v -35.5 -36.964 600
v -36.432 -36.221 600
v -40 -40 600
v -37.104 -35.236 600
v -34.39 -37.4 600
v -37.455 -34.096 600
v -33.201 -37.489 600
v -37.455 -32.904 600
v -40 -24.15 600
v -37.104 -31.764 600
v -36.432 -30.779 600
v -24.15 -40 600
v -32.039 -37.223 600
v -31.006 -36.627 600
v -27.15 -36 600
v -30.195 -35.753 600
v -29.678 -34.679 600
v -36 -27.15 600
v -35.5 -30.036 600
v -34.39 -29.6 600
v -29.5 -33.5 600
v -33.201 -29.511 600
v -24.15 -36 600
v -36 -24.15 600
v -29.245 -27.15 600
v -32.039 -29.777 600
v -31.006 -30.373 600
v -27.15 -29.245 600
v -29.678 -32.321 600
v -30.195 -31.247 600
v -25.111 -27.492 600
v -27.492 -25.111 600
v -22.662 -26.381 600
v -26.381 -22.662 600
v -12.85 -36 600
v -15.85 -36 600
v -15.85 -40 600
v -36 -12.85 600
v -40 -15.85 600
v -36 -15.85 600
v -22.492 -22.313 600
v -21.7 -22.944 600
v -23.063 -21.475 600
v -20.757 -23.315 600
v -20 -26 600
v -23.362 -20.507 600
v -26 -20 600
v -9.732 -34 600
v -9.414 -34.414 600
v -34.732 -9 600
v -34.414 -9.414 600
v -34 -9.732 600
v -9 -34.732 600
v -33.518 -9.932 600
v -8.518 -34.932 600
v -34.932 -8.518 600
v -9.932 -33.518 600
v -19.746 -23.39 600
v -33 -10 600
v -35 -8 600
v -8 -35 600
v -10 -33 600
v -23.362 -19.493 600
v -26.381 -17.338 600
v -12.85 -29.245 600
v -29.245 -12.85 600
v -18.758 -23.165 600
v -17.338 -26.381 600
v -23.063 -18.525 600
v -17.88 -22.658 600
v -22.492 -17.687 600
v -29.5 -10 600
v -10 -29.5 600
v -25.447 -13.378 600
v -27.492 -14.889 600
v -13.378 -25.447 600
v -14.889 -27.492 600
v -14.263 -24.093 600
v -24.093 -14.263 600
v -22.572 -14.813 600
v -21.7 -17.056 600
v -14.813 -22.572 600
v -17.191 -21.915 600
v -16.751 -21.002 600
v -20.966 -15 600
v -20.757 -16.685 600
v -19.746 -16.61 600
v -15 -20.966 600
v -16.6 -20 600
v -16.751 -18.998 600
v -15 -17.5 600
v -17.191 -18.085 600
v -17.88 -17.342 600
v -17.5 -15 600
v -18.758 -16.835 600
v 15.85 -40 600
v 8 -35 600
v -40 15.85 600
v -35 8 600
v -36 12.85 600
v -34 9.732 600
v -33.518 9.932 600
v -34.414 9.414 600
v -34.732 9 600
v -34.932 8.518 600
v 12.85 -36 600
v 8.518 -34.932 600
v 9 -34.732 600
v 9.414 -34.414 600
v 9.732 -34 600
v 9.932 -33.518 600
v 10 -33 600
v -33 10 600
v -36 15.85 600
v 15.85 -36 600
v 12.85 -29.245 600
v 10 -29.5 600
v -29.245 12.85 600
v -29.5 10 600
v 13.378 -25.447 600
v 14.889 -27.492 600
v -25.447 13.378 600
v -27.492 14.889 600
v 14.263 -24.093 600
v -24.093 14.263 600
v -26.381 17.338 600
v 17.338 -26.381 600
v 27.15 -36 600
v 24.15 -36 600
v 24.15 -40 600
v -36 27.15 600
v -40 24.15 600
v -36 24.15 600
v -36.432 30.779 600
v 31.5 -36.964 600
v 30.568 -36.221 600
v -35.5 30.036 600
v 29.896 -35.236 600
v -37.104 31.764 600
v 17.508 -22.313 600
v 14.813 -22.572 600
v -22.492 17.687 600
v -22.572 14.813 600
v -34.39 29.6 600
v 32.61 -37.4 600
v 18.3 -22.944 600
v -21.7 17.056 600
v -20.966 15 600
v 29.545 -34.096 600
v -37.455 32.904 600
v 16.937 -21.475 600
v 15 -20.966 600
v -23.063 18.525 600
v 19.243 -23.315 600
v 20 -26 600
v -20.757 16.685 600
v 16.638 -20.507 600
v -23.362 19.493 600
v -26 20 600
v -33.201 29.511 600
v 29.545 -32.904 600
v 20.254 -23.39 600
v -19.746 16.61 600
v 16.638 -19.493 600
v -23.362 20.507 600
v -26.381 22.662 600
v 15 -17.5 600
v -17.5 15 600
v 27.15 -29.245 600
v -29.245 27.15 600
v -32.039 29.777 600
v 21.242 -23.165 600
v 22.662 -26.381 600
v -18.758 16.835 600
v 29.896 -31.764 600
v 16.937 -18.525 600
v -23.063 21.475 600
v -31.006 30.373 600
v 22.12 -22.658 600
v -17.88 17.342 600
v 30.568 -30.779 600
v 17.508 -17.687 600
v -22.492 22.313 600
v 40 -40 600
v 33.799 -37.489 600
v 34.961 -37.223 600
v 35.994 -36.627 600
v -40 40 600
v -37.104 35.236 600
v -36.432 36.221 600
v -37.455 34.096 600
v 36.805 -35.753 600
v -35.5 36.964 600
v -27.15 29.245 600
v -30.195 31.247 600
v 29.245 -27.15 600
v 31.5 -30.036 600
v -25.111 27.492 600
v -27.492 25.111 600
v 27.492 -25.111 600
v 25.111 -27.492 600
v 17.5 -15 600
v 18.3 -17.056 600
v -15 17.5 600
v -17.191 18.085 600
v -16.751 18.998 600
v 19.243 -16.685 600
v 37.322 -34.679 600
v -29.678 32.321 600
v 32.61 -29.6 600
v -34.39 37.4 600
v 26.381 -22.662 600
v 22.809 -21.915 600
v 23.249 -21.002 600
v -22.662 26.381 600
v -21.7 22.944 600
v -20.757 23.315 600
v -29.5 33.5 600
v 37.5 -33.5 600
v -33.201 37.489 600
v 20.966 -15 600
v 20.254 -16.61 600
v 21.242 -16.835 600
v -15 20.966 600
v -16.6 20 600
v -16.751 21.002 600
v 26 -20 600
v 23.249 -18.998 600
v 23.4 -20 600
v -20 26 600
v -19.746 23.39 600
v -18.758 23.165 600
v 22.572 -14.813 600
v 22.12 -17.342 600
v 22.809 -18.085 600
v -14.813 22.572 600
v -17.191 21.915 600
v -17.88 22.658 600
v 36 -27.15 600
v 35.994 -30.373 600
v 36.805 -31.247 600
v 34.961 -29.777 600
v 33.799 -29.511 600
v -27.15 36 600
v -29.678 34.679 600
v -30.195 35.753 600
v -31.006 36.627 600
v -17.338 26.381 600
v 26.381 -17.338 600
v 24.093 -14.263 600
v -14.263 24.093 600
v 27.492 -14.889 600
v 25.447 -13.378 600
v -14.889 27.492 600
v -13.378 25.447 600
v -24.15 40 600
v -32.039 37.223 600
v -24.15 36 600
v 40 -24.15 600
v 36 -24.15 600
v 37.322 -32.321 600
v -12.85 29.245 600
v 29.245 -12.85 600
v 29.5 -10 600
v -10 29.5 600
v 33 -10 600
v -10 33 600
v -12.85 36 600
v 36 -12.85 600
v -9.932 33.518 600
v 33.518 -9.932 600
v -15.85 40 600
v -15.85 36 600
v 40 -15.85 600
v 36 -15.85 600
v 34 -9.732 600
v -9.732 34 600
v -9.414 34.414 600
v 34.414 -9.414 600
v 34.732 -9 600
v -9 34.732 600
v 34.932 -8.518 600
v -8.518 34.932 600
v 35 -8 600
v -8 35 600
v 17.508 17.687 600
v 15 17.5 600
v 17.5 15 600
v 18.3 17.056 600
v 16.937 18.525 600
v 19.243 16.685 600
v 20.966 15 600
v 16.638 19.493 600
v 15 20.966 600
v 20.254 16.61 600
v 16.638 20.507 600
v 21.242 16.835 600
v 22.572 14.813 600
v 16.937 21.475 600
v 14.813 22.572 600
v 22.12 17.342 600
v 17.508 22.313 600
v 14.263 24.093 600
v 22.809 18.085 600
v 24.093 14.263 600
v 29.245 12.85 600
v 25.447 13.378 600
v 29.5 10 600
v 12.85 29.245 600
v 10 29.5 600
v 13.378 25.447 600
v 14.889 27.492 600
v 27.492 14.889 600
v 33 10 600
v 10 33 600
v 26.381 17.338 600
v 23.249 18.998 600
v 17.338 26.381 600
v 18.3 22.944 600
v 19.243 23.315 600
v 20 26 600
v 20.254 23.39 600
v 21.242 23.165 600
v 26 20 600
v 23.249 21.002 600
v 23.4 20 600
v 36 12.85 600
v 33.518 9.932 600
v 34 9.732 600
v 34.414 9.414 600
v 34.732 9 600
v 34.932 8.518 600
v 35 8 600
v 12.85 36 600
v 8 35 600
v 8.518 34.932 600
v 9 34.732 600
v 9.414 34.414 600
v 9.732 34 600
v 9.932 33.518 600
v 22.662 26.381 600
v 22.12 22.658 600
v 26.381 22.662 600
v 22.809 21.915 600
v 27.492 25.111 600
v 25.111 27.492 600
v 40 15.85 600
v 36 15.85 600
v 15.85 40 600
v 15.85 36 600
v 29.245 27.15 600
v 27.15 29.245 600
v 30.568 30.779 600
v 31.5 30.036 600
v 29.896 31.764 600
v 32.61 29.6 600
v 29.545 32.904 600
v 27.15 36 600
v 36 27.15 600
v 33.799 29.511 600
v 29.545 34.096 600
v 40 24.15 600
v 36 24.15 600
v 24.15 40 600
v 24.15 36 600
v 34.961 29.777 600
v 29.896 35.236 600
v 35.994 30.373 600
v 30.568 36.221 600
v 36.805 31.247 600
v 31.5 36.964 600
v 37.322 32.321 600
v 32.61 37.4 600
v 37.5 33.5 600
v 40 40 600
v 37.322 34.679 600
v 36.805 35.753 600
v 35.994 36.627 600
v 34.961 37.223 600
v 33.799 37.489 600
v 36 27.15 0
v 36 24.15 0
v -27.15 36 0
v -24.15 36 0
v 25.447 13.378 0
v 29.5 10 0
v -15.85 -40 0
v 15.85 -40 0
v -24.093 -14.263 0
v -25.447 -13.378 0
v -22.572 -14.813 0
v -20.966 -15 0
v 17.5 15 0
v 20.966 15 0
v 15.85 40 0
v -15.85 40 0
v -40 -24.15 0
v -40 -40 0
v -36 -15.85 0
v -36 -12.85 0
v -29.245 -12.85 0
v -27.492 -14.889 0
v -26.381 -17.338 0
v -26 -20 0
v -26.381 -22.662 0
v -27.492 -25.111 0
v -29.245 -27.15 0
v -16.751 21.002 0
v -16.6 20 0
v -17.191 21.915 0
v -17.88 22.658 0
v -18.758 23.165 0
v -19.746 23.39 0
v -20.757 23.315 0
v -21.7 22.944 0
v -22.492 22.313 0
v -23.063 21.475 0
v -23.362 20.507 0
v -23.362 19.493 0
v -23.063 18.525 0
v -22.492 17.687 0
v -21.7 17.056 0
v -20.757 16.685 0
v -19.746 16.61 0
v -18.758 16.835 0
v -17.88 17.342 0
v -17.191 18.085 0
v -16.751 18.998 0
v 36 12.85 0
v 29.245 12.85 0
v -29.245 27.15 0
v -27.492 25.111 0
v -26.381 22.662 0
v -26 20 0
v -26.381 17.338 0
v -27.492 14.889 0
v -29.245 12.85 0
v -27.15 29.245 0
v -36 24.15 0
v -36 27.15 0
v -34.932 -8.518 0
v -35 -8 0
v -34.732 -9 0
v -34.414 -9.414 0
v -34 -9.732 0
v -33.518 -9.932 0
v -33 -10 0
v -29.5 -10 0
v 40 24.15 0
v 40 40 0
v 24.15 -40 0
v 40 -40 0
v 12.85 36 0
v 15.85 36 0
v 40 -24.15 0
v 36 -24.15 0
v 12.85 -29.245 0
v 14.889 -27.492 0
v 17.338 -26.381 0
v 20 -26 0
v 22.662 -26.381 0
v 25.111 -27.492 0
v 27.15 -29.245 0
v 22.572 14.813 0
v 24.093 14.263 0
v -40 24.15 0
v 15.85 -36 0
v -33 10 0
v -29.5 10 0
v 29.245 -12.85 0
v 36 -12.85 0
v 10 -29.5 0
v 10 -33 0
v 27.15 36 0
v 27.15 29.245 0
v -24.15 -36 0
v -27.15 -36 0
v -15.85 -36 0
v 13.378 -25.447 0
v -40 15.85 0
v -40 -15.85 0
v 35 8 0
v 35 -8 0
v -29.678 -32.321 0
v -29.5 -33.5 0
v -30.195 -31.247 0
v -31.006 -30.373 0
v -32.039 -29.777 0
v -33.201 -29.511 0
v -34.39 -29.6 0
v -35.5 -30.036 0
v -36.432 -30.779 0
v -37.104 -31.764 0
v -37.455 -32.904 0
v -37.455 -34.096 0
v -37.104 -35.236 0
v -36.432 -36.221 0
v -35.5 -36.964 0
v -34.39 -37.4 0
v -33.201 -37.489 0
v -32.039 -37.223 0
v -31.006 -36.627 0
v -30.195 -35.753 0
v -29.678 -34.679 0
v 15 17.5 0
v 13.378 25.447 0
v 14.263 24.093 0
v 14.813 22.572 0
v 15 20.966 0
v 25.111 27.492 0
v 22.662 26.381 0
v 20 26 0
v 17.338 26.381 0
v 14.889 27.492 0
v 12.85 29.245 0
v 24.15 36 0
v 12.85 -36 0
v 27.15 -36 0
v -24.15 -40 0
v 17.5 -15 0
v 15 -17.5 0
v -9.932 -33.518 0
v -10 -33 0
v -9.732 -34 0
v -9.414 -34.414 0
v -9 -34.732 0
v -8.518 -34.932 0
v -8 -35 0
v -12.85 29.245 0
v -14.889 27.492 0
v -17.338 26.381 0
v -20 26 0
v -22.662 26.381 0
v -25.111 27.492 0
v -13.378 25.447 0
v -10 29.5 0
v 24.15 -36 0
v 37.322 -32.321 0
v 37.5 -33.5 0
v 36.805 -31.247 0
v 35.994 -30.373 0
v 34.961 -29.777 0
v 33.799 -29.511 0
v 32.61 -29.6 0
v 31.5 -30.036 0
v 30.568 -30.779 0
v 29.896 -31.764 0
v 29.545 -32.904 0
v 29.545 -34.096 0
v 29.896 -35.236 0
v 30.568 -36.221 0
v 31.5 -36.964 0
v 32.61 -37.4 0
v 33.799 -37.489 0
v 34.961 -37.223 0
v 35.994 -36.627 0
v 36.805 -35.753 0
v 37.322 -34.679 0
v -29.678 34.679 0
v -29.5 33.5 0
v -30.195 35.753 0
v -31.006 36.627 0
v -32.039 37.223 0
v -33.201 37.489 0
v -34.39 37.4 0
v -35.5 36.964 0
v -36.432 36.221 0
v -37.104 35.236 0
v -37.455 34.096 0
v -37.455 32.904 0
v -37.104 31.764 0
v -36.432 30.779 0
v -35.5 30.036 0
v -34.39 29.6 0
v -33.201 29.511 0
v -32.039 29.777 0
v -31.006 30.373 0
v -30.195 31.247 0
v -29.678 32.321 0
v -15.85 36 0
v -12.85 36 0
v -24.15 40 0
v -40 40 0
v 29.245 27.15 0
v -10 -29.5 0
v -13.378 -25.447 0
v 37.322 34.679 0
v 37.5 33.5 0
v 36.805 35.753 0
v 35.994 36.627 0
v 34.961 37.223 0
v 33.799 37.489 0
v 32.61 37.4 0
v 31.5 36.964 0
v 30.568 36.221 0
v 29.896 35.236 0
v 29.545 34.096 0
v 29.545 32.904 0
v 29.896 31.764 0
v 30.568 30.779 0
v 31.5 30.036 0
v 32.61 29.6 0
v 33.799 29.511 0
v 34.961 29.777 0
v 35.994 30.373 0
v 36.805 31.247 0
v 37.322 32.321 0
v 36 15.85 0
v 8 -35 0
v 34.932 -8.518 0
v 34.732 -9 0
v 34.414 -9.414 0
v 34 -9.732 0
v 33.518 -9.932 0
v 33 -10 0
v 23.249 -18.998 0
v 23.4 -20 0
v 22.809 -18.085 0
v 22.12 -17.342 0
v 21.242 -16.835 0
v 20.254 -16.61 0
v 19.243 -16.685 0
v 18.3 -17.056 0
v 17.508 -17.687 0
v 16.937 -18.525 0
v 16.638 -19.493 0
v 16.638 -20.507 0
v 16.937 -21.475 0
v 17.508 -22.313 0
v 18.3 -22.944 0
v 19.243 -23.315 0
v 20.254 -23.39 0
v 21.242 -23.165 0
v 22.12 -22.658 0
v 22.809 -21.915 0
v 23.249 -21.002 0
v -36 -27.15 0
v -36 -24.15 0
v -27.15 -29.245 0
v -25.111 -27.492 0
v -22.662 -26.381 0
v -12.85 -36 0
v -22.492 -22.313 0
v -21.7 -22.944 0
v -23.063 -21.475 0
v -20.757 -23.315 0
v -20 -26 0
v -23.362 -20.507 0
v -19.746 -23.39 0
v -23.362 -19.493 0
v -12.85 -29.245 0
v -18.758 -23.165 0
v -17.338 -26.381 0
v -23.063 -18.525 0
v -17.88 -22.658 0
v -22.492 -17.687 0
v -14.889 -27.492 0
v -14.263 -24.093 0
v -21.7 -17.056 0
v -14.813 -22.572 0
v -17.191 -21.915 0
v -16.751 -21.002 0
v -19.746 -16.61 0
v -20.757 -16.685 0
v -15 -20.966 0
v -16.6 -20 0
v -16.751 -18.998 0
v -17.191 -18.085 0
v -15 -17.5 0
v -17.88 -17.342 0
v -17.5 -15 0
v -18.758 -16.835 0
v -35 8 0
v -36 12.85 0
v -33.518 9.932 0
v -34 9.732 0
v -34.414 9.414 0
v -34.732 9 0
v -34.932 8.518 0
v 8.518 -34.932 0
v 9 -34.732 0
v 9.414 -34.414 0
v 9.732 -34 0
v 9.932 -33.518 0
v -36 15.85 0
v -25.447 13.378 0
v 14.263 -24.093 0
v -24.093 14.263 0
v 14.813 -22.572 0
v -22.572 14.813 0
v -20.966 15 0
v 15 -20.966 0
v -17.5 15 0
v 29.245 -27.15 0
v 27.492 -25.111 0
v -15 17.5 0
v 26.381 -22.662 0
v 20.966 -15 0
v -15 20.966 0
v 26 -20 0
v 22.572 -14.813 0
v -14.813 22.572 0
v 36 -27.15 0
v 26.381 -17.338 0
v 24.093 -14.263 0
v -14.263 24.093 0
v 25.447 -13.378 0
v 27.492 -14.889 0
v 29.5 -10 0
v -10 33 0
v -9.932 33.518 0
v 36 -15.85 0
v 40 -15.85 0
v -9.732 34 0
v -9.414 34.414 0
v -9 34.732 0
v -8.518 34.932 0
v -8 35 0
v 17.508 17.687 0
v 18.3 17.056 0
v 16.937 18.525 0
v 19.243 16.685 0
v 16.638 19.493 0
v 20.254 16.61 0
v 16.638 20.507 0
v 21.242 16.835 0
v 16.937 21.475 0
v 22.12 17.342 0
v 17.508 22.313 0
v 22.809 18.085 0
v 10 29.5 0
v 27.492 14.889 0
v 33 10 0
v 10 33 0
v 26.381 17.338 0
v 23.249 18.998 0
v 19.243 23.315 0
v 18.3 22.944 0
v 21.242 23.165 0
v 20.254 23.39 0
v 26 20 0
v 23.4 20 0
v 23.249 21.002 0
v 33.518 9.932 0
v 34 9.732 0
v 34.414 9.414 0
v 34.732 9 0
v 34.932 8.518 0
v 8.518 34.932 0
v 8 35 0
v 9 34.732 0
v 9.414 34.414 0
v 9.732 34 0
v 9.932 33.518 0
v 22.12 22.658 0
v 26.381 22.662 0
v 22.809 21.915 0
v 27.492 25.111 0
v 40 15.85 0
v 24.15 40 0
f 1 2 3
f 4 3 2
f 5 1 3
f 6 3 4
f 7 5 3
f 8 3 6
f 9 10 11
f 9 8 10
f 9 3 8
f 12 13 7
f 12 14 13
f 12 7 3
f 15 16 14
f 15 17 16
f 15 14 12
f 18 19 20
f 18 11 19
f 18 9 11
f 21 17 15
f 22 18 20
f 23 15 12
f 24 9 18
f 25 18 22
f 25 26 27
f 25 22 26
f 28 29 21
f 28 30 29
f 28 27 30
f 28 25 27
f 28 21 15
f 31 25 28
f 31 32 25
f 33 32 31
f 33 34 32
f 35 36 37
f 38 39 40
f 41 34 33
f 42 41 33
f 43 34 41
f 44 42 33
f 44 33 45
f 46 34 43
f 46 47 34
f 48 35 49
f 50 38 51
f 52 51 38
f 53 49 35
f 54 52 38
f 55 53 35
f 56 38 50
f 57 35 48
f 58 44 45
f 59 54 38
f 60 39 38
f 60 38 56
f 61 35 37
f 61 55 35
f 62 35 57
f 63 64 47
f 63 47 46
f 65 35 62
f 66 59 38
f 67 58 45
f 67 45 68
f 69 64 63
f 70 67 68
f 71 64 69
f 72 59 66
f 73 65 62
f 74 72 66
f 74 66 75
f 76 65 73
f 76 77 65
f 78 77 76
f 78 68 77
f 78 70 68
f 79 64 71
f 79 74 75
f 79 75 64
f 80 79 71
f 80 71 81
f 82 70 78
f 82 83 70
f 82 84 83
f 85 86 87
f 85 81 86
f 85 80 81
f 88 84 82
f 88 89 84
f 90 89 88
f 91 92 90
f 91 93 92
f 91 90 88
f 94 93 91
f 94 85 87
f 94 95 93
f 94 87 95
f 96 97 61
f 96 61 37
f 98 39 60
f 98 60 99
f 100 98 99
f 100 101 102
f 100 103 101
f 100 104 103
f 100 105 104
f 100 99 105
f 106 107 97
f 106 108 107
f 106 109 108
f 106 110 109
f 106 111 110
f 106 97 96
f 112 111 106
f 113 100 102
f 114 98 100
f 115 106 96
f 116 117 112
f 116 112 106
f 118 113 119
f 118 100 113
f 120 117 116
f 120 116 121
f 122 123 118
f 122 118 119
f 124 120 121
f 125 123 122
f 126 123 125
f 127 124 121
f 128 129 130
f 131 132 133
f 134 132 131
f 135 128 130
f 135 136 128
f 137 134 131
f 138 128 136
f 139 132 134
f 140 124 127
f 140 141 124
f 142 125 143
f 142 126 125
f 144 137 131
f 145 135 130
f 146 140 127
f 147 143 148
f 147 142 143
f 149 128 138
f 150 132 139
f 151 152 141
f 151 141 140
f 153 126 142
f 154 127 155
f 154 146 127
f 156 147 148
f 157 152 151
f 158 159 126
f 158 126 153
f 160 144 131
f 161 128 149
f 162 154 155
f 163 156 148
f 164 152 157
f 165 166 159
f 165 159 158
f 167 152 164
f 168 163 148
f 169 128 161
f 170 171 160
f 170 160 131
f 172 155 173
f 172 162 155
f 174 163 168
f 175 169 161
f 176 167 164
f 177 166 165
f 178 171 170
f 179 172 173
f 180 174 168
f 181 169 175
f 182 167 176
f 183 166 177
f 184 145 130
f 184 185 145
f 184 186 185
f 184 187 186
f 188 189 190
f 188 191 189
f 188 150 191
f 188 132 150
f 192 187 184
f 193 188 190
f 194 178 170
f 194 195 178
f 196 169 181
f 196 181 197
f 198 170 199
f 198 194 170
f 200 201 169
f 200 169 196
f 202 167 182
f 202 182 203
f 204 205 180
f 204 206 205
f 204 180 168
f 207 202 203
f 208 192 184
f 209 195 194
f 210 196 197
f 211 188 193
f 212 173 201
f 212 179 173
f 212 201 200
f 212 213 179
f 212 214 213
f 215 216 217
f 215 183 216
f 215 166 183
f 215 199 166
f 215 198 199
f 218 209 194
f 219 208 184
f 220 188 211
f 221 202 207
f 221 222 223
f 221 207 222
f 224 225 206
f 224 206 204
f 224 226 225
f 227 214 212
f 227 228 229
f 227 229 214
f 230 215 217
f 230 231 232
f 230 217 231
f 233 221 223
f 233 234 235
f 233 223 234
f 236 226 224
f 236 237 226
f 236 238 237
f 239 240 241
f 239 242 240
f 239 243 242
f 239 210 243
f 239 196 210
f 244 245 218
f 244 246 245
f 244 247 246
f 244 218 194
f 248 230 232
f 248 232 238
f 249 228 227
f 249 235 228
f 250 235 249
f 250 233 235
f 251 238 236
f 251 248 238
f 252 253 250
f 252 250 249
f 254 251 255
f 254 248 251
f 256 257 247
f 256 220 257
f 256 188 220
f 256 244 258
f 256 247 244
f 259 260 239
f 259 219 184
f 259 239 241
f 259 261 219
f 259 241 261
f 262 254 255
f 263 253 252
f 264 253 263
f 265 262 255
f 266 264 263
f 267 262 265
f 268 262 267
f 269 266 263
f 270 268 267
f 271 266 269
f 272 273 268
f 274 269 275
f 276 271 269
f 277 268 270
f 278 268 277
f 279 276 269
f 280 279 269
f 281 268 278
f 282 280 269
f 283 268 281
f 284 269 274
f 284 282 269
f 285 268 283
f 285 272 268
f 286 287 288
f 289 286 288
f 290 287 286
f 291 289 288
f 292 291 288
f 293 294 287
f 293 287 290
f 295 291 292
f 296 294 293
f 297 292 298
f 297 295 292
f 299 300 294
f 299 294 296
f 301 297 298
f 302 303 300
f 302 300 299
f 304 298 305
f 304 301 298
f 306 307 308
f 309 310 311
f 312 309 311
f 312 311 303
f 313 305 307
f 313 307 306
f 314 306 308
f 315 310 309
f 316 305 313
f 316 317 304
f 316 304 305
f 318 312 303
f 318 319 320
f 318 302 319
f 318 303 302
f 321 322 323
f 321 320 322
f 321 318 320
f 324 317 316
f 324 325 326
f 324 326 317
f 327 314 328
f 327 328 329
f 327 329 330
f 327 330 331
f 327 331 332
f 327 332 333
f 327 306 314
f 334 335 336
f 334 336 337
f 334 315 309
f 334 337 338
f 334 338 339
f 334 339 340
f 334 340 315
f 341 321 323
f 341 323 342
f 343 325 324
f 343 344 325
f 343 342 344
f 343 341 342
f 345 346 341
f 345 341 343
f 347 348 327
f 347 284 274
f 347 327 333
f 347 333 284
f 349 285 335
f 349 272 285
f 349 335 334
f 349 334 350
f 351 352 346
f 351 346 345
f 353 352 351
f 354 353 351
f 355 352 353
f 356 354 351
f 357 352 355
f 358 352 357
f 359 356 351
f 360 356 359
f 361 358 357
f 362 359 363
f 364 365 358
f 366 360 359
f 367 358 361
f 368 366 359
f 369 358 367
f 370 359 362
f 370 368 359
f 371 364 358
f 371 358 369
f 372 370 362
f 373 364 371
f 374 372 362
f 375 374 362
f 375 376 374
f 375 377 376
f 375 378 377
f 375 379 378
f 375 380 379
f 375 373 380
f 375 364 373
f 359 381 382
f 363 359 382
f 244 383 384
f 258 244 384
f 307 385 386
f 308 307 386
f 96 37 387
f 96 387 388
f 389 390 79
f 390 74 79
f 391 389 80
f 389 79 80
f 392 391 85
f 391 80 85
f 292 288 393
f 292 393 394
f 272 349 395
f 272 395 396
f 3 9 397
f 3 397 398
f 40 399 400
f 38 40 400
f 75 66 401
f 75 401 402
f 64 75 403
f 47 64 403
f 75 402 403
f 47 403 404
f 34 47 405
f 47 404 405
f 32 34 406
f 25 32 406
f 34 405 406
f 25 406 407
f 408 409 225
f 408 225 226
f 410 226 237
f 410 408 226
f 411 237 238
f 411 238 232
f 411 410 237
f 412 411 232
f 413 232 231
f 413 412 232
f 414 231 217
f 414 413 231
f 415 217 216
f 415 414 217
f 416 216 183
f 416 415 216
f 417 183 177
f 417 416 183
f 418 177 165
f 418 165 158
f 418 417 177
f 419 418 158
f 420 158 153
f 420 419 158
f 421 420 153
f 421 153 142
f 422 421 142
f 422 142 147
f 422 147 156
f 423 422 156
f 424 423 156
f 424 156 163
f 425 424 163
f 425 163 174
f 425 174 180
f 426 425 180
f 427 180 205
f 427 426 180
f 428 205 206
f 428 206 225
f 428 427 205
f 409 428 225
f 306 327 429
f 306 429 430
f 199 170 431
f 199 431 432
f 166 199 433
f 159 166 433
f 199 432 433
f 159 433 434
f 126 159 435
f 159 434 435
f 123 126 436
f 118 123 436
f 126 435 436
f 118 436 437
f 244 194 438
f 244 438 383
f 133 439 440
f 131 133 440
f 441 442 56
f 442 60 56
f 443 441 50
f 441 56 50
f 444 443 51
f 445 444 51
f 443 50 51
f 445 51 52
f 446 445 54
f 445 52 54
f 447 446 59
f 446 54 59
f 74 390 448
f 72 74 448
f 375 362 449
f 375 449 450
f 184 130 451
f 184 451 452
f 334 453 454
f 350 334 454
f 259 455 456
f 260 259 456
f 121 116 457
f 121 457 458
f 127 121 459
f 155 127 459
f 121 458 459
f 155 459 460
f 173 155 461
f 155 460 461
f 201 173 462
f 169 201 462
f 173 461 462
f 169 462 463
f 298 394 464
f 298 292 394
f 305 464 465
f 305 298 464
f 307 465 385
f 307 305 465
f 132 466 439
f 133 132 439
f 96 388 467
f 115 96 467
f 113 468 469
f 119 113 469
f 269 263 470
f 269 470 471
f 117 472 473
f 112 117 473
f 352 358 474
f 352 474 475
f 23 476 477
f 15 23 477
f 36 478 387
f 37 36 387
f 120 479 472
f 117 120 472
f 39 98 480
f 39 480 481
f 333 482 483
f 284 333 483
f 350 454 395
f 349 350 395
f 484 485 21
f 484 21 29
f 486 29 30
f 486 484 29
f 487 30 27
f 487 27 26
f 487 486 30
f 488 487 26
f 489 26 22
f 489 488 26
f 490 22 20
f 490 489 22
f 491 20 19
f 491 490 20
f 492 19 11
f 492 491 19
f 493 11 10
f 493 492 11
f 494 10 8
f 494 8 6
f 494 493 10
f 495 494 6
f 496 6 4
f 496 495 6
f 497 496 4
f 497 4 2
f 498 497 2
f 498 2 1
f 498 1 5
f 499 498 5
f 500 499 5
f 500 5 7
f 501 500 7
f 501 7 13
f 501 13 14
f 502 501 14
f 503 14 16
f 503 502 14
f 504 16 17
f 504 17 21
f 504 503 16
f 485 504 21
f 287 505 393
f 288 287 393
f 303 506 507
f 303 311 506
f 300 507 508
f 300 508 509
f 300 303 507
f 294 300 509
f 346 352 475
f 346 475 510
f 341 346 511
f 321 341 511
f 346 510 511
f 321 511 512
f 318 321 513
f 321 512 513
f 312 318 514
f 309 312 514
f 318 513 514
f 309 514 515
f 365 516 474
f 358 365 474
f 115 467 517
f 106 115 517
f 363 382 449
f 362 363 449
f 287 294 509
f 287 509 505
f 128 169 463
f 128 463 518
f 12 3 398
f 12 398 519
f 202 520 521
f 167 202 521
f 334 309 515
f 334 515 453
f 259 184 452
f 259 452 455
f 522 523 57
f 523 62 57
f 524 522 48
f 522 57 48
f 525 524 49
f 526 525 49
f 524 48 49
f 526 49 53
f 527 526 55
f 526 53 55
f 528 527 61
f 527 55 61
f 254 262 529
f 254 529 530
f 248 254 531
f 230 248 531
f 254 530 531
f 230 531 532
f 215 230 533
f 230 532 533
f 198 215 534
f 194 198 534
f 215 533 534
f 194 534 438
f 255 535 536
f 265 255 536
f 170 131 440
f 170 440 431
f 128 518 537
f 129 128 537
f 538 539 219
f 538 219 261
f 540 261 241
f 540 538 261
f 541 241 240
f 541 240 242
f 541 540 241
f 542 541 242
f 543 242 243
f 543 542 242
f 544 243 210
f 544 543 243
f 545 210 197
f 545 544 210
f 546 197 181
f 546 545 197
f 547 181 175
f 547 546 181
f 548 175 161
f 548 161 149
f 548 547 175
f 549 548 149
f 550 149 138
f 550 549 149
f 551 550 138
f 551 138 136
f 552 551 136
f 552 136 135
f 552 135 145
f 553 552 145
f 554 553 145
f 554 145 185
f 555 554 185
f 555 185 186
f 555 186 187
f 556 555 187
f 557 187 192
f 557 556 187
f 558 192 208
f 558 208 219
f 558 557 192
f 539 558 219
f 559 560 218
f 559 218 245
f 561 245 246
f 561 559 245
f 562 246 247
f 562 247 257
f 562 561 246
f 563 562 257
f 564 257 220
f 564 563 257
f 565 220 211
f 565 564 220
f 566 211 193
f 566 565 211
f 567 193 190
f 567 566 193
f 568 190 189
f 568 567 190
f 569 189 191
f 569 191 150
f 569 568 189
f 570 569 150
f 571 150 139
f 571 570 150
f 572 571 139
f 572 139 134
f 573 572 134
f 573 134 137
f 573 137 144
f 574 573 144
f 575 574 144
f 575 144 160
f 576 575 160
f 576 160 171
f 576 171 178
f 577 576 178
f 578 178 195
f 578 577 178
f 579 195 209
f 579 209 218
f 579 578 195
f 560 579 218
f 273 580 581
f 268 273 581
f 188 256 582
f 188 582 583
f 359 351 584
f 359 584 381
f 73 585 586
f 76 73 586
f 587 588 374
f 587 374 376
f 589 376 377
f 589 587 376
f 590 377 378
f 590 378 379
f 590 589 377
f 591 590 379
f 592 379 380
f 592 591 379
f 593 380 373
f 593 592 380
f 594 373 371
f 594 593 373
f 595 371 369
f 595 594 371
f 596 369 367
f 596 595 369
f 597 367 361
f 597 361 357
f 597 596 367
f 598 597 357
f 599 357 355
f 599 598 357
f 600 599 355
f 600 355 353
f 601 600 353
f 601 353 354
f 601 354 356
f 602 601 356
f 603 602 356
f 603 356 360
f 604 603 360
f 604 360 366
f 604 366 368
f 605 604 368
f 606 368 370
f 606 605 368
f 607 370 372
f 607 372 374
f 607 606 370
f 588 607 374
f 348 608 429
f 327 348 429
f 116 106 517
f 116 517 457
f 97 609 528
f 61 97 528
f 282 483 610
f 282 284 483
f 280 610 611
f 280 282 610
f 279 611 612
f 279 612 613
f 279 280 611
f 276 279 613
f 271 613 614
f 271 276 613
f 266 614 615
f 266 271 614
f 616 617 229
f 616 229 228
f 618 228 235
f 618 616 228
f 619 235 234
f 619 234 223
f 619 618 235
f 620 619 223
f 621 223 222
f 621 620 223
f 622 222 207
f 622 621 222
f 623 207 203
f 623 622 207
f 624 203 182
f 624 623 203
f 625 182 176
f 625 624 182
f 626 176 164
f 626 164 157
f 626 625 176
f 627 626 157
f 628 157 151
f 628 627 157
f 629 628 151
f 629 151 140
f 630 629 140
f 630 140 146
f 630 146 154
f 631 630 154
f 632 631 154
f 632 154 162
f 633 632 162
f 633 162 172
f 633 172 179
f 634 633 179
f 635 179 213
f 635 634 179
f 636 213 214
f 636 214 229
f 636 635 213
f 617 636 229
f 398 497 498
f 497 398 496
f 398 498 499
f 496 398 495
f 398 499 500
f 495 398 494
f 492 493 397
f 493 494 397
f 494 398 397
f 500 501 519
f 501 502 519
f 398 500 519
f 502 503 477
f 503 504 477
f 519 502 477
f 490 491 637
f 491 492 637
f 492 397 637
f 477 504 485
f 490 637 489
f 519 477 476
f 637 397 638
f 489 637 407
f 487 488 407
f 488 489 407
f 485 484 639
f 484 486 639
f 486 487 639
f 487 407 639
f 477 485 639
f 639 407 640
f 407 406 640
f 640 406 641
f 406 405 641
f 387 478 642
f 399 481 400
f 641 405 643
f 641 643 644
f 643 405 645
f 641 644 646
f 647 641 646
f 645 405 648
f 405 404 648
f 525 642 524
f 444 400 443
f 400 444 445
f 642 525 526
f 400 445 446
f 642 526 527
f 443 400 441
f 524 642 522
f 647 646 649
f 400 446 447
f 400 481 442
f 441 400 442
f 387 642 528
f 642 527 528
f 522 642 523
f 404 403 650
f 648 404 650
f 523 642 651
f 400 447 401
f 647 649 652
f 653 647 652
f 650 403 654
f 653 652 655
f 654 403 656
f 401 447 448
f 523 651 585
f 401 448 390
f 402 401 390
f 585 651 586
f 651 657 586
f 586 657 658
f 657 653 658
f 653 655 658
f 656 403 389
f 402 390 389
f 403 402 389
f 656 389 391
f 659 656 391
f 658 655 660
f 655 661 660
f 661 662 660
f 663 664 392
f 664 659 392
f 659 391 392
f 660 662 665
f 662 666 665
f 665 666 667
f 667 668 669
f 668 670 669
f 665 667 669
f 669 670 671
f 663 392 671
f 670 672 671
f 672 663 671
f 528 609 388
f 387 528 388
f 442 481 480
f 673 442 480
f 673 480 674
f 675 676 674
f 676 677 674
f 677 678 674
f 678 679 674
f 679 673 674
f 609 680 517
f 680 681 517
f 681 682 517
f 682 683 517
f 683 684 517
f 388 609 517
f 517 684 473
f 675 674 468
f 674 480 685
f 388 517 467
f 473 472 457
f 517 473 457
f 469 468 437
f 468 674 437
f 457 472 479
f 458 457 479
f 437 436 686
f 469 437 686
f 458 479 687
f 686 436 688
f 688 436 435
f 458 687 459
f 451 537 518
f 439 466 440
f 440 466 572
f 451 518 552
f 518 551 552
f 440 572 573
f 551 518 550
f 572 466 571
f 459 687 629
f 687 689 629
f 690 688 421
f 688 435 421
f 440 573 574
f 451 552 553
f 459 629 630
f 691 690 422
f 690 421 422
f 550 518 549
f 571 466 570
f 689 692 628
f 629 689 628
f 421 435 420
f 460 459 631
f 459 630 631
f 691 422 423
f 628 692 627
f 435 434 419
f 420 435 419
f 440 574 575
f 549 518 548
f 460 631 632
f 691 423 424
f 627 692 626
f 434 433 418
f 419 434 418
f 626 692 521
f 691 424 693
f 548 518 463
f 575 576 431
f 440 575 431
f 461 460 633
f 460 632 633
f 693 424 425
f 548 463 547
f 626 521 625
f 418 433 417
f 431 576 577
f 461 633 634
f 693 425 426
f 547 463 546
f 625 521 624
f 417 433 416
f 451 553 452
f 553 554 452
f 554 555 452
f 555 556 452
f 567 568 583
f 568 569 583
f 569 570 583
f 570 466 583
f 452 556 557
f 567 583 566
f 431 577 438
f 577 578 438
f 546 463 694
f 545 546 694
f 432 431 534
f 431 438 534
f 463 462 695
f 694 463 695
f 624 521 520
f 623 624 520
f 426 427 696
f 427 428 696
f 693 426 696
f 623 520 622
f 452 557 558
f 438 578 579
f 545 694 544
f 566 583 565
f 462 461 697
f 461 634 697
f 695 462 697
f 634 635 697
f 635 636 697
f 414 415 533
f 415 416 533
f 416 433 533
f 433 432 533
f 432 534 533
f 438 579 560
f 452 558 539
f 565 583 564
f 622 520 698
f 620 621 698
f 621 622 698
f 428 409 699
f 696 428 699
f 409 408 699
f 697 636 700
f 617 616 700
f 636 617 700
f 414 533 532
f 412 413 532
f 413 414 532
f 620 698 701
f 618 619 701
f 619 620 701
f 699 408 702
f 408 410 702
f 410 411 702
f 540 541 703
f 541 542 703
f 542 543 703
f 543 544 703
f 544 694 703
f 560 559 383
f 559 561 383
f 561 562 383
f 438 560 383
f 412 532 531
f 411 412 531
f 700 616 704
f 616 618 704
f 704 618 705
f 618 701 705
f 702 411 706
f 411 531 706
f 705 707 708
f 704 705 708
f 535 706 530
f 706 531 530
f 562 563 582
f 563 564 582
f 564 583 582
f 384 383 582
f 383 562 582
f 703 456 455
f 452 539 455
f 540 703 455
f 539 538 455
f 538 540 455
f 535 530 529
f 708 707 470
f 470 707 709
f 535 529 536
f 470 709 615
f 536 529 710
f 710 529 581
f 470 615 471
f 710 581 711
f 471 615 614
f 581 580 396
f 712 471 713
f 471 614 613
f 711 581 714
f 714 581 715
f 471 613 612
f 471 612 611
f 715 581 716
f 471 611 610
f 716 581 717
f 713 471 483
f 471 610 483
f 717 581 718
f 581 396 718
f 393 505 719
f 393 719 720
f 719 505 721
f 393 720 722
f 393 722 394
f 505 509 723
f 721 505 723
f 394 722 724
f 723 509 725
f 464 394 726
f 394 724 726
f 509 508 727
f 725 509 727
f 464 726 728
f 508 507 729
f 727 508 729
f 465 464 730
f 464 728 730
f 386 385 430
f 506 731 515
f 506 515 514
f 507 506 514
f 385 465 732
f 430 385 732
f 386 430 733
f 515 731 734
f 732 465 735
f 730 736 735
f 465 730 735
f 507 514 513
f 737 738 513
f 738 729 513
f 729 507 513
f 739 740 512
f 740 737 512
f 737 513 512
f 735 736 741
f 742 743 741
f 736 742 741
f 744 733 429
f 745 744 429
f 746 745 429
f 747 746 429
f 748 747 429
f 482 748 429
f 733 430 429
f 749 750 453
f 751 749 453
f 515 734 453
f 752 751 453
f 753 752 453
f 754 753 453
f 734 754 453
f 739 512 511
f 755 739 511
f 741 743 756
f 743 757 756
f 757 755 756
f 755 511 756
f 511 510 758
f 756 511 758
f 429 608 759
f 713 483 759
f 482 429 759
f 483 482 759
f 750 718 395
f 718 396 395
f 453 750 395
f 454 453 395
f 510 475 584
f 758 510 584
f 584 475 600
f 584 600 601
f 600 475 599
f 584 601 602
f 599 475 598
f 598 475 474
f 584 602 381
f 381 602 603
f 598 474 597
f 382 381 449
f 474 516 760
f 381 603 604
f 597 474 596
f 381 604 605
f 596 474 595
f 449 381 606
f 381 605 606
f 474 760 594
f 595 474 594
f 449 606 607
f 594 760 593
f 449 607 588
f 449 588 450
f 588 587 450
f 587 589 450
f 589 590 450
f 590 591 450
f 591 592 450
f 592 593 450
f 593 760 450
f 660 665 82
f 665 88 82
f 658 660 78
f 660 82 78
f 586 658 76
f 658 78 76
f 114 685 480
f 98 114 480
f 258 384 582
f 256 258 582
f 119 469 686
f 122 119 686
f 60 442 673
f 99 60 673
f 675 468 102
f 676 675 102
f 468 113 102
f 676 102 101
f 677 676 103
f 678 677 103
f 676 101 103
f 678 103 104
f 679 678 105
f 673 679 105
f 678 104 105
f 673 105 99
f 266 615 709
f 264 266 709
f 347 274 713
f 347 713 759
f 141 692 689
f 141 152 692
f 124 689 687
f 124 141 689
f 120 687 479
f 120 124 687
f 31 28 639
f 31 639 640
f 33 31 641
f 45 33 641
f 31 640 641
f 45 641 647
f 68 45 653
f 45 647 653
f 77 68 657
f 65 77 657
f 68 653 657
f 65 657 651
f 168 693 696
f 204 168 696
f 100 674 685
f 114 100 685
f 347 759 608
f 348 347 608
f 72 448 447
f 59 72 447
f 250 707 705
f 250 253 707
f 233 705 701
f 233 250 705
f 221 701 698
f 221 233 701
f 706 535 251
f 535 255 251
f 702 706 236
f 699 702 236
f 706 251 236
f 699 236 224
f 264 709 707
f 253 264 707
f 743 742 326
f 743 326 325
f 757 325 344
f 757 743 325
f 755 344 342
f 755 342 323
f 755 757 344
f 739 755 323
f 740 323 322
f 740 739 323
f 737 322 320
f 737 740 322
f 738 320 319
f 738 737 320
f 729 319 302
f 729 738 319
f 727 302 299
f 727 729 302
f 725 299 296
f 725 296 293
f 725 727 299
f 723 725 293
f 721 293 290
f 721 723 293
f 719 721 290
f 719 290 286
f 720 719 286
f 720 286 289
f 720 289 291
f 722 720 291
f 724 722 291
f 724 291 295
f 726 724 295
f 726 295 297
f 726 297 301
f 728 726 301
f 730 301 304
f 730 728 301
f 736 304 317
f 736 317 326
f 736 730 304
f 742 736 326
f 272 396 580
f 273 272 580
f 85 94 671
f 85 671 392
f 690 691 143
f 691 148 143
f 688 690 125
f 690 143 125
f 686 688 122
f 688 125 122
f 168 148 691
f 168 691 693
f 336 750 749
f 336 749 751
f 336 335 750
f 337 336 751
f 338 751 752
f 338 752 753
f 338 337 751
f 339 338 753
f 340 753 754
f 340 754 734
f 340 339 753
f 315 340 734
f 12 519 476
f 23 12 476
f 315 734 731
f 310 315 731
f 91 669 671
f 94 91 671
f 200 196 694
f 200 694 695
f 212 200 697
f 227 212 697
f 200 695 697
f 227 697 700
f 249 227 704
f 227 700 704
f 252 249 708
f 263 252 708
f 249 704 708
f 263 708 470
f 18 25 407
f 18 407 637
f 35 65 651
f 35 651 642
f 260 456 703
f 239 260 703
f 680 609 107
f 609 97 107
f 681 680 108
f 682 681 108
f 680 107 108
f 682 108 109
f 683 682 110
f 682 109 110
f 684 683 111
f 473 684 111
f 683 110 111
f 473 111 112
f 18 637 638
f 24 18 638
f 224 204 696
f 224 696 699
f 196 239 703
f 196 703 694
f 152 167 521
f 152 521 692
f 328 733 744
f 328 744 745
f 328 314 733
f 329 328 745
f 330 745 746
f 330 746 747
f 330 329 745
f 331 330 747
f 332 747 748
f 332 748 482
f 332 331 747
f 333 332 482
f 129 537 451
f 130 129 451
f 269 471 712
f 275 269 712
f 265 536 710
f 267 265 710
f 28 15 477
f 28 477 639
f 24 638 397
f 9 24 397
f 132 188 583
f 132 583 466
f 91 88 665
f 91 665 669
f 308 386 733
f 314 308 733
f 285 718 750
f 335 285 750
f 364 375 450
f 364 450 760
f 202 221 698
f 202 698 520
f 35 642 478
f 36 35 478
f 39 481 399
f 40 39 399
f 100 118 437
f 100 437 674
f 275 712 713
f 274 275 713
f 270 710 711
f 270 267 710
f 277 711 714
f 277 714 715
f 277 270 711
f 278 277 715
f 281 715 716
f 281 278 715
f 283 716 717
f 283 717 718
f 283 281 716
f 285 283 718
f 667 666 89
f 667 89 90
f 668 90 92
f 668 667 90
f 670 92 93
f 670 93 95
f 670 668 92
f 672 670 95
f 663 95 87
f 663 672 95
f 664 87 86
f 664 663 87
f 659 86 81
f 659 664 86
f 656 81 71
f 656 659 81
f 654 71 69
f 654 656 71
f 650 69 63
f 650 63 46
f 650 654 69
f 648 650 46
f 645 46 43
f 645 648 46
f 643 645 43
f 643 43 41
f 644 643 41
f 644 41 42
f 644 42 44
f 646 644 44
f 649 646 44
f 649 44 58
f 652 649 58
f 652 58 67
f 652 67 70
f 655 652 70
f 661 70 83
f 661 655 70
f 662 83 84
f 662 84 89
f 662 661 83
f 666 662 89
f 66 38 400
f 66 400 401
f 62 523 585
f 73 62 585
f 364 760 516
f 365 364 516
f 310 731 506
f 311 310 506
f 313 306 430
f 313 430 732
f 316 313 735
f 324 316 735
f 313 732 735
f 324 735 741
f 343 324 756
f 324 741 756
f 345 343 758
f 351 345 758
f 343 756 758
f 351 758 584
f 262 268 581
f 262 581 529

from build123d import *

# Parameters (mm, degrees)
F0_R     = 4
F0_R_2   = 3.4
F1_DEPTH = 600
F2_R     = 2
F3_R     = 7


with BuildPart() as f1:
    # F0 (on Top) → F1 (new body)
    with BuildSketch(Plane.XY):
        with BuildLine():
            Line((24.15, -40), (40, -40))
            Line((40, -40), (40, -24.15))
            Line((40, -24.15), (36, -24.15))
            Line((36, -24.15), (36, -27.15))
            Line((36, -27.15), (29.244802, -27.15))
            ThreePointArc((29.244802, -27.15), (26, -20), (29.244802, -12.85))
            Line((29.244802, -12.85), (36, -12.85))
            Line((36, -12.85), (36, -15.85))
            Line((36, -15.85), (40, -15.85))
            Line((40, -15.85), (40, 15.85))
            Line((40, 15.85), (36, 15.85))
            Line((36, 15.85), (36, 12.85))
            Line((36, 12.85), (29.244802, 12.85))
            ThreePointArc((29.244802, 12.85), (26, 20), (29.244802, 27.15))
            Line((29.244802, 27.15), (36, 27.15))
            Line((36, 27.15), (36, 24.15))
            Line((36, 24.15), (40, 24.15))
            Line((40, 24.15), (40, 40))
            Line((40, 40), (24.15, 40))
            Line((24.15, 40), (24.15, 36))
            Line((24.15, 36), (27.15, 36))
            Line((27.15, 36), (27.15, 29.244802))
            ThreePointArc((27.15, 29.244802), (20, 26), (12.85, 29.244802))
            Line((12.85, 29.244802), (12.85, 36))
            Line((12.85, 36), (15.85, 36))
            Line((15.85, 36), (15.85, 40))
            Line((15.85, 40), (-15.85, 40))
            Line((-15.85, 40), (-15.85, 36))
            Line((-15.85, 36), (-12.85, 36))
            Line((-12.85, 36), (-12.85, 29.244802))
            ThreePointArc((-12.85, 29.244802), (-20, 26), (-27.15, 29.244802))
            Line((-27.15, 29.244802), (-27.15, 36))
            Line((-27.15, 36), (-24.15, 36))
            Line((-24.15, 36), (-24.15, 40))
            Line((-24.15, 40), (-40, 40))
            Line((-40, 40), (-40, 24.15))
            Line((-40, 24.15), (-36, 24.15))
            Line((-36, 24.15), (-36, 27.15))
            Line((-36, 27.15), (-29.244802, 27.15))
            ThreePointArc((-29.244802, 27.15), (-26, 20), (-29.244802, 12.85))
            Line((-29.244802, 12.85), (-36, 12.85))
            Line((-36, 12.85), (-36, 15.85))
            Line((-36, 15.85), (-40, 15.85))
            Line((-40, 15.85), (-40, -15.85))
            Line((-40, -15.85), (-36, -15.85))
            Line((-36, -15.85), (-36, -12.85))
            Line((-36, -12.85), (-29.244802, -12.85))
            ThreePointArc((-29.244802, -12.85), (-26, -20), (-29.244802, -27.15))
            Line((-29.244802, -27.15), (-36, -27.15))
            Line((-36, -27.15), (-36, -24.15))
            Line((-36, -24.15), (-40, -24.15))
            Line((-40, -24.15), (-40, -40))
            Line((-40, -40), (-24.15, -40))
            Line((-24.15, -40), (-24.15, -36))
            Line((-24.15, -36), (-27.15, -36))
            Line((-27.15, -36), (-27.15, -29.244802))
            ThreePointArc((-27.15, -29.244802), (-20, -26), (-12.85, -29.244802))
            Line((-12.85, -29.244802), (-12.85, -36))
            Line((-12.85, -36), (-15.85, -36))
            Line((-15.85, -36), (-15.85, -40))
            Line((-15.85, -40), (15.85, -40))
            Line((15.85, -40), (15.85, -36))
            Line((15.85, -36), (12.85, -36))
            Line((12.85, -36), (12.85, -29.244802))
            ThreePointArc((12.85, -29.244802), (20, -26), (27.15, -29.244802))
            Line((27.15, -29.244802), (27.15, -36))
            Line((27.15, -36), (24.15, -36))
            Line((24.15, -36), (24.15, -40))
        make_face()
        with Locations((-33.5, -33.5)):
            Circle(F0_R, mode=Mode.SUBTRACT)
        with Locations((-20, -20)):
            Circle(F0_R_2, mode=Mode.SUBTRACT)
        with Locations((33.5, -33.5)):
            Circle(F0_R, mode=Mode.SUBTRACT)
        with Locations((20, -20)):
            Circle(F0_R_2, mode=Mode.SUBTRACT)
        with Locations((-33.5, 33.5)):
            Circle(F0_R, mode=Mode.SUBTRACT)
        with Locations((-20, 20)):
            Circle(F0_R_2, mode=Mode.SUBTRACT)
        Polygon((-10, 29.5), (-10, 35), (0, 35), (10, 35), (10, 29.5), (15, 23.5), (15, 17.5), (17.5, 15), (23.5, 15), (29.5, 10), (35, 10), (35, 0), (35, -10), (29.5, -10), (23.5, -15), (17.5, -15), (15, -17.5), (15, -23.5), (10, -29.5), (10, -35), (0, -35), (-10, -35), (-10, -29.5), (-15, -23.5), (-15, -17.5), (-17.5, -15), (-23.5, -15), (-29.5, -10), (-35, -10), (-35, 0), (-35, 10), (-29.5, 10), (-23.5, 15), (-17.5, 15), (-15, 17.5), (-15, 23.5), align=None, mode=Mode.SUBTRACT)
        with Locations((20, 20)):
            Circle(F0_R_2, mode=Mode.SUBTRACT)
        with Locations((33.5, 33.5)):
            Circle(F0_R, mode=Mode.SUBTRACT)
    extrude(amount=F1_DEPTH)

    # F2
    f2_edges = [f1.edges().sort_by_distance(p)[0] for p in [
        (-10, 35, 300),
        (10, 35, 300),
        (35, 10, 300),
        (35, -10, 300),
        (-35, 10, 300),
        (-35, -10, 300),
        (10, -35, 300),
        (-10, -35, 300),
    ]]
    fillet(f2_edges, radius=F2_R)

    # F3
    f3_edges = [f1.edges().sort_by_distance(p)[0] for p in [
        (-15, 23.5, 300),
        (15, 23.5, 300),
        (23.5, 15, 300),
        (-23.5, 15, 300),
        (-23.5, -15, 300),
        (23.5, -15, 300),
        (15, -23.5, 300),
        (-15, -23.5, 300),
    ]]
    fillet(f3_edges, radius=F3_R)


solid = f1.part
